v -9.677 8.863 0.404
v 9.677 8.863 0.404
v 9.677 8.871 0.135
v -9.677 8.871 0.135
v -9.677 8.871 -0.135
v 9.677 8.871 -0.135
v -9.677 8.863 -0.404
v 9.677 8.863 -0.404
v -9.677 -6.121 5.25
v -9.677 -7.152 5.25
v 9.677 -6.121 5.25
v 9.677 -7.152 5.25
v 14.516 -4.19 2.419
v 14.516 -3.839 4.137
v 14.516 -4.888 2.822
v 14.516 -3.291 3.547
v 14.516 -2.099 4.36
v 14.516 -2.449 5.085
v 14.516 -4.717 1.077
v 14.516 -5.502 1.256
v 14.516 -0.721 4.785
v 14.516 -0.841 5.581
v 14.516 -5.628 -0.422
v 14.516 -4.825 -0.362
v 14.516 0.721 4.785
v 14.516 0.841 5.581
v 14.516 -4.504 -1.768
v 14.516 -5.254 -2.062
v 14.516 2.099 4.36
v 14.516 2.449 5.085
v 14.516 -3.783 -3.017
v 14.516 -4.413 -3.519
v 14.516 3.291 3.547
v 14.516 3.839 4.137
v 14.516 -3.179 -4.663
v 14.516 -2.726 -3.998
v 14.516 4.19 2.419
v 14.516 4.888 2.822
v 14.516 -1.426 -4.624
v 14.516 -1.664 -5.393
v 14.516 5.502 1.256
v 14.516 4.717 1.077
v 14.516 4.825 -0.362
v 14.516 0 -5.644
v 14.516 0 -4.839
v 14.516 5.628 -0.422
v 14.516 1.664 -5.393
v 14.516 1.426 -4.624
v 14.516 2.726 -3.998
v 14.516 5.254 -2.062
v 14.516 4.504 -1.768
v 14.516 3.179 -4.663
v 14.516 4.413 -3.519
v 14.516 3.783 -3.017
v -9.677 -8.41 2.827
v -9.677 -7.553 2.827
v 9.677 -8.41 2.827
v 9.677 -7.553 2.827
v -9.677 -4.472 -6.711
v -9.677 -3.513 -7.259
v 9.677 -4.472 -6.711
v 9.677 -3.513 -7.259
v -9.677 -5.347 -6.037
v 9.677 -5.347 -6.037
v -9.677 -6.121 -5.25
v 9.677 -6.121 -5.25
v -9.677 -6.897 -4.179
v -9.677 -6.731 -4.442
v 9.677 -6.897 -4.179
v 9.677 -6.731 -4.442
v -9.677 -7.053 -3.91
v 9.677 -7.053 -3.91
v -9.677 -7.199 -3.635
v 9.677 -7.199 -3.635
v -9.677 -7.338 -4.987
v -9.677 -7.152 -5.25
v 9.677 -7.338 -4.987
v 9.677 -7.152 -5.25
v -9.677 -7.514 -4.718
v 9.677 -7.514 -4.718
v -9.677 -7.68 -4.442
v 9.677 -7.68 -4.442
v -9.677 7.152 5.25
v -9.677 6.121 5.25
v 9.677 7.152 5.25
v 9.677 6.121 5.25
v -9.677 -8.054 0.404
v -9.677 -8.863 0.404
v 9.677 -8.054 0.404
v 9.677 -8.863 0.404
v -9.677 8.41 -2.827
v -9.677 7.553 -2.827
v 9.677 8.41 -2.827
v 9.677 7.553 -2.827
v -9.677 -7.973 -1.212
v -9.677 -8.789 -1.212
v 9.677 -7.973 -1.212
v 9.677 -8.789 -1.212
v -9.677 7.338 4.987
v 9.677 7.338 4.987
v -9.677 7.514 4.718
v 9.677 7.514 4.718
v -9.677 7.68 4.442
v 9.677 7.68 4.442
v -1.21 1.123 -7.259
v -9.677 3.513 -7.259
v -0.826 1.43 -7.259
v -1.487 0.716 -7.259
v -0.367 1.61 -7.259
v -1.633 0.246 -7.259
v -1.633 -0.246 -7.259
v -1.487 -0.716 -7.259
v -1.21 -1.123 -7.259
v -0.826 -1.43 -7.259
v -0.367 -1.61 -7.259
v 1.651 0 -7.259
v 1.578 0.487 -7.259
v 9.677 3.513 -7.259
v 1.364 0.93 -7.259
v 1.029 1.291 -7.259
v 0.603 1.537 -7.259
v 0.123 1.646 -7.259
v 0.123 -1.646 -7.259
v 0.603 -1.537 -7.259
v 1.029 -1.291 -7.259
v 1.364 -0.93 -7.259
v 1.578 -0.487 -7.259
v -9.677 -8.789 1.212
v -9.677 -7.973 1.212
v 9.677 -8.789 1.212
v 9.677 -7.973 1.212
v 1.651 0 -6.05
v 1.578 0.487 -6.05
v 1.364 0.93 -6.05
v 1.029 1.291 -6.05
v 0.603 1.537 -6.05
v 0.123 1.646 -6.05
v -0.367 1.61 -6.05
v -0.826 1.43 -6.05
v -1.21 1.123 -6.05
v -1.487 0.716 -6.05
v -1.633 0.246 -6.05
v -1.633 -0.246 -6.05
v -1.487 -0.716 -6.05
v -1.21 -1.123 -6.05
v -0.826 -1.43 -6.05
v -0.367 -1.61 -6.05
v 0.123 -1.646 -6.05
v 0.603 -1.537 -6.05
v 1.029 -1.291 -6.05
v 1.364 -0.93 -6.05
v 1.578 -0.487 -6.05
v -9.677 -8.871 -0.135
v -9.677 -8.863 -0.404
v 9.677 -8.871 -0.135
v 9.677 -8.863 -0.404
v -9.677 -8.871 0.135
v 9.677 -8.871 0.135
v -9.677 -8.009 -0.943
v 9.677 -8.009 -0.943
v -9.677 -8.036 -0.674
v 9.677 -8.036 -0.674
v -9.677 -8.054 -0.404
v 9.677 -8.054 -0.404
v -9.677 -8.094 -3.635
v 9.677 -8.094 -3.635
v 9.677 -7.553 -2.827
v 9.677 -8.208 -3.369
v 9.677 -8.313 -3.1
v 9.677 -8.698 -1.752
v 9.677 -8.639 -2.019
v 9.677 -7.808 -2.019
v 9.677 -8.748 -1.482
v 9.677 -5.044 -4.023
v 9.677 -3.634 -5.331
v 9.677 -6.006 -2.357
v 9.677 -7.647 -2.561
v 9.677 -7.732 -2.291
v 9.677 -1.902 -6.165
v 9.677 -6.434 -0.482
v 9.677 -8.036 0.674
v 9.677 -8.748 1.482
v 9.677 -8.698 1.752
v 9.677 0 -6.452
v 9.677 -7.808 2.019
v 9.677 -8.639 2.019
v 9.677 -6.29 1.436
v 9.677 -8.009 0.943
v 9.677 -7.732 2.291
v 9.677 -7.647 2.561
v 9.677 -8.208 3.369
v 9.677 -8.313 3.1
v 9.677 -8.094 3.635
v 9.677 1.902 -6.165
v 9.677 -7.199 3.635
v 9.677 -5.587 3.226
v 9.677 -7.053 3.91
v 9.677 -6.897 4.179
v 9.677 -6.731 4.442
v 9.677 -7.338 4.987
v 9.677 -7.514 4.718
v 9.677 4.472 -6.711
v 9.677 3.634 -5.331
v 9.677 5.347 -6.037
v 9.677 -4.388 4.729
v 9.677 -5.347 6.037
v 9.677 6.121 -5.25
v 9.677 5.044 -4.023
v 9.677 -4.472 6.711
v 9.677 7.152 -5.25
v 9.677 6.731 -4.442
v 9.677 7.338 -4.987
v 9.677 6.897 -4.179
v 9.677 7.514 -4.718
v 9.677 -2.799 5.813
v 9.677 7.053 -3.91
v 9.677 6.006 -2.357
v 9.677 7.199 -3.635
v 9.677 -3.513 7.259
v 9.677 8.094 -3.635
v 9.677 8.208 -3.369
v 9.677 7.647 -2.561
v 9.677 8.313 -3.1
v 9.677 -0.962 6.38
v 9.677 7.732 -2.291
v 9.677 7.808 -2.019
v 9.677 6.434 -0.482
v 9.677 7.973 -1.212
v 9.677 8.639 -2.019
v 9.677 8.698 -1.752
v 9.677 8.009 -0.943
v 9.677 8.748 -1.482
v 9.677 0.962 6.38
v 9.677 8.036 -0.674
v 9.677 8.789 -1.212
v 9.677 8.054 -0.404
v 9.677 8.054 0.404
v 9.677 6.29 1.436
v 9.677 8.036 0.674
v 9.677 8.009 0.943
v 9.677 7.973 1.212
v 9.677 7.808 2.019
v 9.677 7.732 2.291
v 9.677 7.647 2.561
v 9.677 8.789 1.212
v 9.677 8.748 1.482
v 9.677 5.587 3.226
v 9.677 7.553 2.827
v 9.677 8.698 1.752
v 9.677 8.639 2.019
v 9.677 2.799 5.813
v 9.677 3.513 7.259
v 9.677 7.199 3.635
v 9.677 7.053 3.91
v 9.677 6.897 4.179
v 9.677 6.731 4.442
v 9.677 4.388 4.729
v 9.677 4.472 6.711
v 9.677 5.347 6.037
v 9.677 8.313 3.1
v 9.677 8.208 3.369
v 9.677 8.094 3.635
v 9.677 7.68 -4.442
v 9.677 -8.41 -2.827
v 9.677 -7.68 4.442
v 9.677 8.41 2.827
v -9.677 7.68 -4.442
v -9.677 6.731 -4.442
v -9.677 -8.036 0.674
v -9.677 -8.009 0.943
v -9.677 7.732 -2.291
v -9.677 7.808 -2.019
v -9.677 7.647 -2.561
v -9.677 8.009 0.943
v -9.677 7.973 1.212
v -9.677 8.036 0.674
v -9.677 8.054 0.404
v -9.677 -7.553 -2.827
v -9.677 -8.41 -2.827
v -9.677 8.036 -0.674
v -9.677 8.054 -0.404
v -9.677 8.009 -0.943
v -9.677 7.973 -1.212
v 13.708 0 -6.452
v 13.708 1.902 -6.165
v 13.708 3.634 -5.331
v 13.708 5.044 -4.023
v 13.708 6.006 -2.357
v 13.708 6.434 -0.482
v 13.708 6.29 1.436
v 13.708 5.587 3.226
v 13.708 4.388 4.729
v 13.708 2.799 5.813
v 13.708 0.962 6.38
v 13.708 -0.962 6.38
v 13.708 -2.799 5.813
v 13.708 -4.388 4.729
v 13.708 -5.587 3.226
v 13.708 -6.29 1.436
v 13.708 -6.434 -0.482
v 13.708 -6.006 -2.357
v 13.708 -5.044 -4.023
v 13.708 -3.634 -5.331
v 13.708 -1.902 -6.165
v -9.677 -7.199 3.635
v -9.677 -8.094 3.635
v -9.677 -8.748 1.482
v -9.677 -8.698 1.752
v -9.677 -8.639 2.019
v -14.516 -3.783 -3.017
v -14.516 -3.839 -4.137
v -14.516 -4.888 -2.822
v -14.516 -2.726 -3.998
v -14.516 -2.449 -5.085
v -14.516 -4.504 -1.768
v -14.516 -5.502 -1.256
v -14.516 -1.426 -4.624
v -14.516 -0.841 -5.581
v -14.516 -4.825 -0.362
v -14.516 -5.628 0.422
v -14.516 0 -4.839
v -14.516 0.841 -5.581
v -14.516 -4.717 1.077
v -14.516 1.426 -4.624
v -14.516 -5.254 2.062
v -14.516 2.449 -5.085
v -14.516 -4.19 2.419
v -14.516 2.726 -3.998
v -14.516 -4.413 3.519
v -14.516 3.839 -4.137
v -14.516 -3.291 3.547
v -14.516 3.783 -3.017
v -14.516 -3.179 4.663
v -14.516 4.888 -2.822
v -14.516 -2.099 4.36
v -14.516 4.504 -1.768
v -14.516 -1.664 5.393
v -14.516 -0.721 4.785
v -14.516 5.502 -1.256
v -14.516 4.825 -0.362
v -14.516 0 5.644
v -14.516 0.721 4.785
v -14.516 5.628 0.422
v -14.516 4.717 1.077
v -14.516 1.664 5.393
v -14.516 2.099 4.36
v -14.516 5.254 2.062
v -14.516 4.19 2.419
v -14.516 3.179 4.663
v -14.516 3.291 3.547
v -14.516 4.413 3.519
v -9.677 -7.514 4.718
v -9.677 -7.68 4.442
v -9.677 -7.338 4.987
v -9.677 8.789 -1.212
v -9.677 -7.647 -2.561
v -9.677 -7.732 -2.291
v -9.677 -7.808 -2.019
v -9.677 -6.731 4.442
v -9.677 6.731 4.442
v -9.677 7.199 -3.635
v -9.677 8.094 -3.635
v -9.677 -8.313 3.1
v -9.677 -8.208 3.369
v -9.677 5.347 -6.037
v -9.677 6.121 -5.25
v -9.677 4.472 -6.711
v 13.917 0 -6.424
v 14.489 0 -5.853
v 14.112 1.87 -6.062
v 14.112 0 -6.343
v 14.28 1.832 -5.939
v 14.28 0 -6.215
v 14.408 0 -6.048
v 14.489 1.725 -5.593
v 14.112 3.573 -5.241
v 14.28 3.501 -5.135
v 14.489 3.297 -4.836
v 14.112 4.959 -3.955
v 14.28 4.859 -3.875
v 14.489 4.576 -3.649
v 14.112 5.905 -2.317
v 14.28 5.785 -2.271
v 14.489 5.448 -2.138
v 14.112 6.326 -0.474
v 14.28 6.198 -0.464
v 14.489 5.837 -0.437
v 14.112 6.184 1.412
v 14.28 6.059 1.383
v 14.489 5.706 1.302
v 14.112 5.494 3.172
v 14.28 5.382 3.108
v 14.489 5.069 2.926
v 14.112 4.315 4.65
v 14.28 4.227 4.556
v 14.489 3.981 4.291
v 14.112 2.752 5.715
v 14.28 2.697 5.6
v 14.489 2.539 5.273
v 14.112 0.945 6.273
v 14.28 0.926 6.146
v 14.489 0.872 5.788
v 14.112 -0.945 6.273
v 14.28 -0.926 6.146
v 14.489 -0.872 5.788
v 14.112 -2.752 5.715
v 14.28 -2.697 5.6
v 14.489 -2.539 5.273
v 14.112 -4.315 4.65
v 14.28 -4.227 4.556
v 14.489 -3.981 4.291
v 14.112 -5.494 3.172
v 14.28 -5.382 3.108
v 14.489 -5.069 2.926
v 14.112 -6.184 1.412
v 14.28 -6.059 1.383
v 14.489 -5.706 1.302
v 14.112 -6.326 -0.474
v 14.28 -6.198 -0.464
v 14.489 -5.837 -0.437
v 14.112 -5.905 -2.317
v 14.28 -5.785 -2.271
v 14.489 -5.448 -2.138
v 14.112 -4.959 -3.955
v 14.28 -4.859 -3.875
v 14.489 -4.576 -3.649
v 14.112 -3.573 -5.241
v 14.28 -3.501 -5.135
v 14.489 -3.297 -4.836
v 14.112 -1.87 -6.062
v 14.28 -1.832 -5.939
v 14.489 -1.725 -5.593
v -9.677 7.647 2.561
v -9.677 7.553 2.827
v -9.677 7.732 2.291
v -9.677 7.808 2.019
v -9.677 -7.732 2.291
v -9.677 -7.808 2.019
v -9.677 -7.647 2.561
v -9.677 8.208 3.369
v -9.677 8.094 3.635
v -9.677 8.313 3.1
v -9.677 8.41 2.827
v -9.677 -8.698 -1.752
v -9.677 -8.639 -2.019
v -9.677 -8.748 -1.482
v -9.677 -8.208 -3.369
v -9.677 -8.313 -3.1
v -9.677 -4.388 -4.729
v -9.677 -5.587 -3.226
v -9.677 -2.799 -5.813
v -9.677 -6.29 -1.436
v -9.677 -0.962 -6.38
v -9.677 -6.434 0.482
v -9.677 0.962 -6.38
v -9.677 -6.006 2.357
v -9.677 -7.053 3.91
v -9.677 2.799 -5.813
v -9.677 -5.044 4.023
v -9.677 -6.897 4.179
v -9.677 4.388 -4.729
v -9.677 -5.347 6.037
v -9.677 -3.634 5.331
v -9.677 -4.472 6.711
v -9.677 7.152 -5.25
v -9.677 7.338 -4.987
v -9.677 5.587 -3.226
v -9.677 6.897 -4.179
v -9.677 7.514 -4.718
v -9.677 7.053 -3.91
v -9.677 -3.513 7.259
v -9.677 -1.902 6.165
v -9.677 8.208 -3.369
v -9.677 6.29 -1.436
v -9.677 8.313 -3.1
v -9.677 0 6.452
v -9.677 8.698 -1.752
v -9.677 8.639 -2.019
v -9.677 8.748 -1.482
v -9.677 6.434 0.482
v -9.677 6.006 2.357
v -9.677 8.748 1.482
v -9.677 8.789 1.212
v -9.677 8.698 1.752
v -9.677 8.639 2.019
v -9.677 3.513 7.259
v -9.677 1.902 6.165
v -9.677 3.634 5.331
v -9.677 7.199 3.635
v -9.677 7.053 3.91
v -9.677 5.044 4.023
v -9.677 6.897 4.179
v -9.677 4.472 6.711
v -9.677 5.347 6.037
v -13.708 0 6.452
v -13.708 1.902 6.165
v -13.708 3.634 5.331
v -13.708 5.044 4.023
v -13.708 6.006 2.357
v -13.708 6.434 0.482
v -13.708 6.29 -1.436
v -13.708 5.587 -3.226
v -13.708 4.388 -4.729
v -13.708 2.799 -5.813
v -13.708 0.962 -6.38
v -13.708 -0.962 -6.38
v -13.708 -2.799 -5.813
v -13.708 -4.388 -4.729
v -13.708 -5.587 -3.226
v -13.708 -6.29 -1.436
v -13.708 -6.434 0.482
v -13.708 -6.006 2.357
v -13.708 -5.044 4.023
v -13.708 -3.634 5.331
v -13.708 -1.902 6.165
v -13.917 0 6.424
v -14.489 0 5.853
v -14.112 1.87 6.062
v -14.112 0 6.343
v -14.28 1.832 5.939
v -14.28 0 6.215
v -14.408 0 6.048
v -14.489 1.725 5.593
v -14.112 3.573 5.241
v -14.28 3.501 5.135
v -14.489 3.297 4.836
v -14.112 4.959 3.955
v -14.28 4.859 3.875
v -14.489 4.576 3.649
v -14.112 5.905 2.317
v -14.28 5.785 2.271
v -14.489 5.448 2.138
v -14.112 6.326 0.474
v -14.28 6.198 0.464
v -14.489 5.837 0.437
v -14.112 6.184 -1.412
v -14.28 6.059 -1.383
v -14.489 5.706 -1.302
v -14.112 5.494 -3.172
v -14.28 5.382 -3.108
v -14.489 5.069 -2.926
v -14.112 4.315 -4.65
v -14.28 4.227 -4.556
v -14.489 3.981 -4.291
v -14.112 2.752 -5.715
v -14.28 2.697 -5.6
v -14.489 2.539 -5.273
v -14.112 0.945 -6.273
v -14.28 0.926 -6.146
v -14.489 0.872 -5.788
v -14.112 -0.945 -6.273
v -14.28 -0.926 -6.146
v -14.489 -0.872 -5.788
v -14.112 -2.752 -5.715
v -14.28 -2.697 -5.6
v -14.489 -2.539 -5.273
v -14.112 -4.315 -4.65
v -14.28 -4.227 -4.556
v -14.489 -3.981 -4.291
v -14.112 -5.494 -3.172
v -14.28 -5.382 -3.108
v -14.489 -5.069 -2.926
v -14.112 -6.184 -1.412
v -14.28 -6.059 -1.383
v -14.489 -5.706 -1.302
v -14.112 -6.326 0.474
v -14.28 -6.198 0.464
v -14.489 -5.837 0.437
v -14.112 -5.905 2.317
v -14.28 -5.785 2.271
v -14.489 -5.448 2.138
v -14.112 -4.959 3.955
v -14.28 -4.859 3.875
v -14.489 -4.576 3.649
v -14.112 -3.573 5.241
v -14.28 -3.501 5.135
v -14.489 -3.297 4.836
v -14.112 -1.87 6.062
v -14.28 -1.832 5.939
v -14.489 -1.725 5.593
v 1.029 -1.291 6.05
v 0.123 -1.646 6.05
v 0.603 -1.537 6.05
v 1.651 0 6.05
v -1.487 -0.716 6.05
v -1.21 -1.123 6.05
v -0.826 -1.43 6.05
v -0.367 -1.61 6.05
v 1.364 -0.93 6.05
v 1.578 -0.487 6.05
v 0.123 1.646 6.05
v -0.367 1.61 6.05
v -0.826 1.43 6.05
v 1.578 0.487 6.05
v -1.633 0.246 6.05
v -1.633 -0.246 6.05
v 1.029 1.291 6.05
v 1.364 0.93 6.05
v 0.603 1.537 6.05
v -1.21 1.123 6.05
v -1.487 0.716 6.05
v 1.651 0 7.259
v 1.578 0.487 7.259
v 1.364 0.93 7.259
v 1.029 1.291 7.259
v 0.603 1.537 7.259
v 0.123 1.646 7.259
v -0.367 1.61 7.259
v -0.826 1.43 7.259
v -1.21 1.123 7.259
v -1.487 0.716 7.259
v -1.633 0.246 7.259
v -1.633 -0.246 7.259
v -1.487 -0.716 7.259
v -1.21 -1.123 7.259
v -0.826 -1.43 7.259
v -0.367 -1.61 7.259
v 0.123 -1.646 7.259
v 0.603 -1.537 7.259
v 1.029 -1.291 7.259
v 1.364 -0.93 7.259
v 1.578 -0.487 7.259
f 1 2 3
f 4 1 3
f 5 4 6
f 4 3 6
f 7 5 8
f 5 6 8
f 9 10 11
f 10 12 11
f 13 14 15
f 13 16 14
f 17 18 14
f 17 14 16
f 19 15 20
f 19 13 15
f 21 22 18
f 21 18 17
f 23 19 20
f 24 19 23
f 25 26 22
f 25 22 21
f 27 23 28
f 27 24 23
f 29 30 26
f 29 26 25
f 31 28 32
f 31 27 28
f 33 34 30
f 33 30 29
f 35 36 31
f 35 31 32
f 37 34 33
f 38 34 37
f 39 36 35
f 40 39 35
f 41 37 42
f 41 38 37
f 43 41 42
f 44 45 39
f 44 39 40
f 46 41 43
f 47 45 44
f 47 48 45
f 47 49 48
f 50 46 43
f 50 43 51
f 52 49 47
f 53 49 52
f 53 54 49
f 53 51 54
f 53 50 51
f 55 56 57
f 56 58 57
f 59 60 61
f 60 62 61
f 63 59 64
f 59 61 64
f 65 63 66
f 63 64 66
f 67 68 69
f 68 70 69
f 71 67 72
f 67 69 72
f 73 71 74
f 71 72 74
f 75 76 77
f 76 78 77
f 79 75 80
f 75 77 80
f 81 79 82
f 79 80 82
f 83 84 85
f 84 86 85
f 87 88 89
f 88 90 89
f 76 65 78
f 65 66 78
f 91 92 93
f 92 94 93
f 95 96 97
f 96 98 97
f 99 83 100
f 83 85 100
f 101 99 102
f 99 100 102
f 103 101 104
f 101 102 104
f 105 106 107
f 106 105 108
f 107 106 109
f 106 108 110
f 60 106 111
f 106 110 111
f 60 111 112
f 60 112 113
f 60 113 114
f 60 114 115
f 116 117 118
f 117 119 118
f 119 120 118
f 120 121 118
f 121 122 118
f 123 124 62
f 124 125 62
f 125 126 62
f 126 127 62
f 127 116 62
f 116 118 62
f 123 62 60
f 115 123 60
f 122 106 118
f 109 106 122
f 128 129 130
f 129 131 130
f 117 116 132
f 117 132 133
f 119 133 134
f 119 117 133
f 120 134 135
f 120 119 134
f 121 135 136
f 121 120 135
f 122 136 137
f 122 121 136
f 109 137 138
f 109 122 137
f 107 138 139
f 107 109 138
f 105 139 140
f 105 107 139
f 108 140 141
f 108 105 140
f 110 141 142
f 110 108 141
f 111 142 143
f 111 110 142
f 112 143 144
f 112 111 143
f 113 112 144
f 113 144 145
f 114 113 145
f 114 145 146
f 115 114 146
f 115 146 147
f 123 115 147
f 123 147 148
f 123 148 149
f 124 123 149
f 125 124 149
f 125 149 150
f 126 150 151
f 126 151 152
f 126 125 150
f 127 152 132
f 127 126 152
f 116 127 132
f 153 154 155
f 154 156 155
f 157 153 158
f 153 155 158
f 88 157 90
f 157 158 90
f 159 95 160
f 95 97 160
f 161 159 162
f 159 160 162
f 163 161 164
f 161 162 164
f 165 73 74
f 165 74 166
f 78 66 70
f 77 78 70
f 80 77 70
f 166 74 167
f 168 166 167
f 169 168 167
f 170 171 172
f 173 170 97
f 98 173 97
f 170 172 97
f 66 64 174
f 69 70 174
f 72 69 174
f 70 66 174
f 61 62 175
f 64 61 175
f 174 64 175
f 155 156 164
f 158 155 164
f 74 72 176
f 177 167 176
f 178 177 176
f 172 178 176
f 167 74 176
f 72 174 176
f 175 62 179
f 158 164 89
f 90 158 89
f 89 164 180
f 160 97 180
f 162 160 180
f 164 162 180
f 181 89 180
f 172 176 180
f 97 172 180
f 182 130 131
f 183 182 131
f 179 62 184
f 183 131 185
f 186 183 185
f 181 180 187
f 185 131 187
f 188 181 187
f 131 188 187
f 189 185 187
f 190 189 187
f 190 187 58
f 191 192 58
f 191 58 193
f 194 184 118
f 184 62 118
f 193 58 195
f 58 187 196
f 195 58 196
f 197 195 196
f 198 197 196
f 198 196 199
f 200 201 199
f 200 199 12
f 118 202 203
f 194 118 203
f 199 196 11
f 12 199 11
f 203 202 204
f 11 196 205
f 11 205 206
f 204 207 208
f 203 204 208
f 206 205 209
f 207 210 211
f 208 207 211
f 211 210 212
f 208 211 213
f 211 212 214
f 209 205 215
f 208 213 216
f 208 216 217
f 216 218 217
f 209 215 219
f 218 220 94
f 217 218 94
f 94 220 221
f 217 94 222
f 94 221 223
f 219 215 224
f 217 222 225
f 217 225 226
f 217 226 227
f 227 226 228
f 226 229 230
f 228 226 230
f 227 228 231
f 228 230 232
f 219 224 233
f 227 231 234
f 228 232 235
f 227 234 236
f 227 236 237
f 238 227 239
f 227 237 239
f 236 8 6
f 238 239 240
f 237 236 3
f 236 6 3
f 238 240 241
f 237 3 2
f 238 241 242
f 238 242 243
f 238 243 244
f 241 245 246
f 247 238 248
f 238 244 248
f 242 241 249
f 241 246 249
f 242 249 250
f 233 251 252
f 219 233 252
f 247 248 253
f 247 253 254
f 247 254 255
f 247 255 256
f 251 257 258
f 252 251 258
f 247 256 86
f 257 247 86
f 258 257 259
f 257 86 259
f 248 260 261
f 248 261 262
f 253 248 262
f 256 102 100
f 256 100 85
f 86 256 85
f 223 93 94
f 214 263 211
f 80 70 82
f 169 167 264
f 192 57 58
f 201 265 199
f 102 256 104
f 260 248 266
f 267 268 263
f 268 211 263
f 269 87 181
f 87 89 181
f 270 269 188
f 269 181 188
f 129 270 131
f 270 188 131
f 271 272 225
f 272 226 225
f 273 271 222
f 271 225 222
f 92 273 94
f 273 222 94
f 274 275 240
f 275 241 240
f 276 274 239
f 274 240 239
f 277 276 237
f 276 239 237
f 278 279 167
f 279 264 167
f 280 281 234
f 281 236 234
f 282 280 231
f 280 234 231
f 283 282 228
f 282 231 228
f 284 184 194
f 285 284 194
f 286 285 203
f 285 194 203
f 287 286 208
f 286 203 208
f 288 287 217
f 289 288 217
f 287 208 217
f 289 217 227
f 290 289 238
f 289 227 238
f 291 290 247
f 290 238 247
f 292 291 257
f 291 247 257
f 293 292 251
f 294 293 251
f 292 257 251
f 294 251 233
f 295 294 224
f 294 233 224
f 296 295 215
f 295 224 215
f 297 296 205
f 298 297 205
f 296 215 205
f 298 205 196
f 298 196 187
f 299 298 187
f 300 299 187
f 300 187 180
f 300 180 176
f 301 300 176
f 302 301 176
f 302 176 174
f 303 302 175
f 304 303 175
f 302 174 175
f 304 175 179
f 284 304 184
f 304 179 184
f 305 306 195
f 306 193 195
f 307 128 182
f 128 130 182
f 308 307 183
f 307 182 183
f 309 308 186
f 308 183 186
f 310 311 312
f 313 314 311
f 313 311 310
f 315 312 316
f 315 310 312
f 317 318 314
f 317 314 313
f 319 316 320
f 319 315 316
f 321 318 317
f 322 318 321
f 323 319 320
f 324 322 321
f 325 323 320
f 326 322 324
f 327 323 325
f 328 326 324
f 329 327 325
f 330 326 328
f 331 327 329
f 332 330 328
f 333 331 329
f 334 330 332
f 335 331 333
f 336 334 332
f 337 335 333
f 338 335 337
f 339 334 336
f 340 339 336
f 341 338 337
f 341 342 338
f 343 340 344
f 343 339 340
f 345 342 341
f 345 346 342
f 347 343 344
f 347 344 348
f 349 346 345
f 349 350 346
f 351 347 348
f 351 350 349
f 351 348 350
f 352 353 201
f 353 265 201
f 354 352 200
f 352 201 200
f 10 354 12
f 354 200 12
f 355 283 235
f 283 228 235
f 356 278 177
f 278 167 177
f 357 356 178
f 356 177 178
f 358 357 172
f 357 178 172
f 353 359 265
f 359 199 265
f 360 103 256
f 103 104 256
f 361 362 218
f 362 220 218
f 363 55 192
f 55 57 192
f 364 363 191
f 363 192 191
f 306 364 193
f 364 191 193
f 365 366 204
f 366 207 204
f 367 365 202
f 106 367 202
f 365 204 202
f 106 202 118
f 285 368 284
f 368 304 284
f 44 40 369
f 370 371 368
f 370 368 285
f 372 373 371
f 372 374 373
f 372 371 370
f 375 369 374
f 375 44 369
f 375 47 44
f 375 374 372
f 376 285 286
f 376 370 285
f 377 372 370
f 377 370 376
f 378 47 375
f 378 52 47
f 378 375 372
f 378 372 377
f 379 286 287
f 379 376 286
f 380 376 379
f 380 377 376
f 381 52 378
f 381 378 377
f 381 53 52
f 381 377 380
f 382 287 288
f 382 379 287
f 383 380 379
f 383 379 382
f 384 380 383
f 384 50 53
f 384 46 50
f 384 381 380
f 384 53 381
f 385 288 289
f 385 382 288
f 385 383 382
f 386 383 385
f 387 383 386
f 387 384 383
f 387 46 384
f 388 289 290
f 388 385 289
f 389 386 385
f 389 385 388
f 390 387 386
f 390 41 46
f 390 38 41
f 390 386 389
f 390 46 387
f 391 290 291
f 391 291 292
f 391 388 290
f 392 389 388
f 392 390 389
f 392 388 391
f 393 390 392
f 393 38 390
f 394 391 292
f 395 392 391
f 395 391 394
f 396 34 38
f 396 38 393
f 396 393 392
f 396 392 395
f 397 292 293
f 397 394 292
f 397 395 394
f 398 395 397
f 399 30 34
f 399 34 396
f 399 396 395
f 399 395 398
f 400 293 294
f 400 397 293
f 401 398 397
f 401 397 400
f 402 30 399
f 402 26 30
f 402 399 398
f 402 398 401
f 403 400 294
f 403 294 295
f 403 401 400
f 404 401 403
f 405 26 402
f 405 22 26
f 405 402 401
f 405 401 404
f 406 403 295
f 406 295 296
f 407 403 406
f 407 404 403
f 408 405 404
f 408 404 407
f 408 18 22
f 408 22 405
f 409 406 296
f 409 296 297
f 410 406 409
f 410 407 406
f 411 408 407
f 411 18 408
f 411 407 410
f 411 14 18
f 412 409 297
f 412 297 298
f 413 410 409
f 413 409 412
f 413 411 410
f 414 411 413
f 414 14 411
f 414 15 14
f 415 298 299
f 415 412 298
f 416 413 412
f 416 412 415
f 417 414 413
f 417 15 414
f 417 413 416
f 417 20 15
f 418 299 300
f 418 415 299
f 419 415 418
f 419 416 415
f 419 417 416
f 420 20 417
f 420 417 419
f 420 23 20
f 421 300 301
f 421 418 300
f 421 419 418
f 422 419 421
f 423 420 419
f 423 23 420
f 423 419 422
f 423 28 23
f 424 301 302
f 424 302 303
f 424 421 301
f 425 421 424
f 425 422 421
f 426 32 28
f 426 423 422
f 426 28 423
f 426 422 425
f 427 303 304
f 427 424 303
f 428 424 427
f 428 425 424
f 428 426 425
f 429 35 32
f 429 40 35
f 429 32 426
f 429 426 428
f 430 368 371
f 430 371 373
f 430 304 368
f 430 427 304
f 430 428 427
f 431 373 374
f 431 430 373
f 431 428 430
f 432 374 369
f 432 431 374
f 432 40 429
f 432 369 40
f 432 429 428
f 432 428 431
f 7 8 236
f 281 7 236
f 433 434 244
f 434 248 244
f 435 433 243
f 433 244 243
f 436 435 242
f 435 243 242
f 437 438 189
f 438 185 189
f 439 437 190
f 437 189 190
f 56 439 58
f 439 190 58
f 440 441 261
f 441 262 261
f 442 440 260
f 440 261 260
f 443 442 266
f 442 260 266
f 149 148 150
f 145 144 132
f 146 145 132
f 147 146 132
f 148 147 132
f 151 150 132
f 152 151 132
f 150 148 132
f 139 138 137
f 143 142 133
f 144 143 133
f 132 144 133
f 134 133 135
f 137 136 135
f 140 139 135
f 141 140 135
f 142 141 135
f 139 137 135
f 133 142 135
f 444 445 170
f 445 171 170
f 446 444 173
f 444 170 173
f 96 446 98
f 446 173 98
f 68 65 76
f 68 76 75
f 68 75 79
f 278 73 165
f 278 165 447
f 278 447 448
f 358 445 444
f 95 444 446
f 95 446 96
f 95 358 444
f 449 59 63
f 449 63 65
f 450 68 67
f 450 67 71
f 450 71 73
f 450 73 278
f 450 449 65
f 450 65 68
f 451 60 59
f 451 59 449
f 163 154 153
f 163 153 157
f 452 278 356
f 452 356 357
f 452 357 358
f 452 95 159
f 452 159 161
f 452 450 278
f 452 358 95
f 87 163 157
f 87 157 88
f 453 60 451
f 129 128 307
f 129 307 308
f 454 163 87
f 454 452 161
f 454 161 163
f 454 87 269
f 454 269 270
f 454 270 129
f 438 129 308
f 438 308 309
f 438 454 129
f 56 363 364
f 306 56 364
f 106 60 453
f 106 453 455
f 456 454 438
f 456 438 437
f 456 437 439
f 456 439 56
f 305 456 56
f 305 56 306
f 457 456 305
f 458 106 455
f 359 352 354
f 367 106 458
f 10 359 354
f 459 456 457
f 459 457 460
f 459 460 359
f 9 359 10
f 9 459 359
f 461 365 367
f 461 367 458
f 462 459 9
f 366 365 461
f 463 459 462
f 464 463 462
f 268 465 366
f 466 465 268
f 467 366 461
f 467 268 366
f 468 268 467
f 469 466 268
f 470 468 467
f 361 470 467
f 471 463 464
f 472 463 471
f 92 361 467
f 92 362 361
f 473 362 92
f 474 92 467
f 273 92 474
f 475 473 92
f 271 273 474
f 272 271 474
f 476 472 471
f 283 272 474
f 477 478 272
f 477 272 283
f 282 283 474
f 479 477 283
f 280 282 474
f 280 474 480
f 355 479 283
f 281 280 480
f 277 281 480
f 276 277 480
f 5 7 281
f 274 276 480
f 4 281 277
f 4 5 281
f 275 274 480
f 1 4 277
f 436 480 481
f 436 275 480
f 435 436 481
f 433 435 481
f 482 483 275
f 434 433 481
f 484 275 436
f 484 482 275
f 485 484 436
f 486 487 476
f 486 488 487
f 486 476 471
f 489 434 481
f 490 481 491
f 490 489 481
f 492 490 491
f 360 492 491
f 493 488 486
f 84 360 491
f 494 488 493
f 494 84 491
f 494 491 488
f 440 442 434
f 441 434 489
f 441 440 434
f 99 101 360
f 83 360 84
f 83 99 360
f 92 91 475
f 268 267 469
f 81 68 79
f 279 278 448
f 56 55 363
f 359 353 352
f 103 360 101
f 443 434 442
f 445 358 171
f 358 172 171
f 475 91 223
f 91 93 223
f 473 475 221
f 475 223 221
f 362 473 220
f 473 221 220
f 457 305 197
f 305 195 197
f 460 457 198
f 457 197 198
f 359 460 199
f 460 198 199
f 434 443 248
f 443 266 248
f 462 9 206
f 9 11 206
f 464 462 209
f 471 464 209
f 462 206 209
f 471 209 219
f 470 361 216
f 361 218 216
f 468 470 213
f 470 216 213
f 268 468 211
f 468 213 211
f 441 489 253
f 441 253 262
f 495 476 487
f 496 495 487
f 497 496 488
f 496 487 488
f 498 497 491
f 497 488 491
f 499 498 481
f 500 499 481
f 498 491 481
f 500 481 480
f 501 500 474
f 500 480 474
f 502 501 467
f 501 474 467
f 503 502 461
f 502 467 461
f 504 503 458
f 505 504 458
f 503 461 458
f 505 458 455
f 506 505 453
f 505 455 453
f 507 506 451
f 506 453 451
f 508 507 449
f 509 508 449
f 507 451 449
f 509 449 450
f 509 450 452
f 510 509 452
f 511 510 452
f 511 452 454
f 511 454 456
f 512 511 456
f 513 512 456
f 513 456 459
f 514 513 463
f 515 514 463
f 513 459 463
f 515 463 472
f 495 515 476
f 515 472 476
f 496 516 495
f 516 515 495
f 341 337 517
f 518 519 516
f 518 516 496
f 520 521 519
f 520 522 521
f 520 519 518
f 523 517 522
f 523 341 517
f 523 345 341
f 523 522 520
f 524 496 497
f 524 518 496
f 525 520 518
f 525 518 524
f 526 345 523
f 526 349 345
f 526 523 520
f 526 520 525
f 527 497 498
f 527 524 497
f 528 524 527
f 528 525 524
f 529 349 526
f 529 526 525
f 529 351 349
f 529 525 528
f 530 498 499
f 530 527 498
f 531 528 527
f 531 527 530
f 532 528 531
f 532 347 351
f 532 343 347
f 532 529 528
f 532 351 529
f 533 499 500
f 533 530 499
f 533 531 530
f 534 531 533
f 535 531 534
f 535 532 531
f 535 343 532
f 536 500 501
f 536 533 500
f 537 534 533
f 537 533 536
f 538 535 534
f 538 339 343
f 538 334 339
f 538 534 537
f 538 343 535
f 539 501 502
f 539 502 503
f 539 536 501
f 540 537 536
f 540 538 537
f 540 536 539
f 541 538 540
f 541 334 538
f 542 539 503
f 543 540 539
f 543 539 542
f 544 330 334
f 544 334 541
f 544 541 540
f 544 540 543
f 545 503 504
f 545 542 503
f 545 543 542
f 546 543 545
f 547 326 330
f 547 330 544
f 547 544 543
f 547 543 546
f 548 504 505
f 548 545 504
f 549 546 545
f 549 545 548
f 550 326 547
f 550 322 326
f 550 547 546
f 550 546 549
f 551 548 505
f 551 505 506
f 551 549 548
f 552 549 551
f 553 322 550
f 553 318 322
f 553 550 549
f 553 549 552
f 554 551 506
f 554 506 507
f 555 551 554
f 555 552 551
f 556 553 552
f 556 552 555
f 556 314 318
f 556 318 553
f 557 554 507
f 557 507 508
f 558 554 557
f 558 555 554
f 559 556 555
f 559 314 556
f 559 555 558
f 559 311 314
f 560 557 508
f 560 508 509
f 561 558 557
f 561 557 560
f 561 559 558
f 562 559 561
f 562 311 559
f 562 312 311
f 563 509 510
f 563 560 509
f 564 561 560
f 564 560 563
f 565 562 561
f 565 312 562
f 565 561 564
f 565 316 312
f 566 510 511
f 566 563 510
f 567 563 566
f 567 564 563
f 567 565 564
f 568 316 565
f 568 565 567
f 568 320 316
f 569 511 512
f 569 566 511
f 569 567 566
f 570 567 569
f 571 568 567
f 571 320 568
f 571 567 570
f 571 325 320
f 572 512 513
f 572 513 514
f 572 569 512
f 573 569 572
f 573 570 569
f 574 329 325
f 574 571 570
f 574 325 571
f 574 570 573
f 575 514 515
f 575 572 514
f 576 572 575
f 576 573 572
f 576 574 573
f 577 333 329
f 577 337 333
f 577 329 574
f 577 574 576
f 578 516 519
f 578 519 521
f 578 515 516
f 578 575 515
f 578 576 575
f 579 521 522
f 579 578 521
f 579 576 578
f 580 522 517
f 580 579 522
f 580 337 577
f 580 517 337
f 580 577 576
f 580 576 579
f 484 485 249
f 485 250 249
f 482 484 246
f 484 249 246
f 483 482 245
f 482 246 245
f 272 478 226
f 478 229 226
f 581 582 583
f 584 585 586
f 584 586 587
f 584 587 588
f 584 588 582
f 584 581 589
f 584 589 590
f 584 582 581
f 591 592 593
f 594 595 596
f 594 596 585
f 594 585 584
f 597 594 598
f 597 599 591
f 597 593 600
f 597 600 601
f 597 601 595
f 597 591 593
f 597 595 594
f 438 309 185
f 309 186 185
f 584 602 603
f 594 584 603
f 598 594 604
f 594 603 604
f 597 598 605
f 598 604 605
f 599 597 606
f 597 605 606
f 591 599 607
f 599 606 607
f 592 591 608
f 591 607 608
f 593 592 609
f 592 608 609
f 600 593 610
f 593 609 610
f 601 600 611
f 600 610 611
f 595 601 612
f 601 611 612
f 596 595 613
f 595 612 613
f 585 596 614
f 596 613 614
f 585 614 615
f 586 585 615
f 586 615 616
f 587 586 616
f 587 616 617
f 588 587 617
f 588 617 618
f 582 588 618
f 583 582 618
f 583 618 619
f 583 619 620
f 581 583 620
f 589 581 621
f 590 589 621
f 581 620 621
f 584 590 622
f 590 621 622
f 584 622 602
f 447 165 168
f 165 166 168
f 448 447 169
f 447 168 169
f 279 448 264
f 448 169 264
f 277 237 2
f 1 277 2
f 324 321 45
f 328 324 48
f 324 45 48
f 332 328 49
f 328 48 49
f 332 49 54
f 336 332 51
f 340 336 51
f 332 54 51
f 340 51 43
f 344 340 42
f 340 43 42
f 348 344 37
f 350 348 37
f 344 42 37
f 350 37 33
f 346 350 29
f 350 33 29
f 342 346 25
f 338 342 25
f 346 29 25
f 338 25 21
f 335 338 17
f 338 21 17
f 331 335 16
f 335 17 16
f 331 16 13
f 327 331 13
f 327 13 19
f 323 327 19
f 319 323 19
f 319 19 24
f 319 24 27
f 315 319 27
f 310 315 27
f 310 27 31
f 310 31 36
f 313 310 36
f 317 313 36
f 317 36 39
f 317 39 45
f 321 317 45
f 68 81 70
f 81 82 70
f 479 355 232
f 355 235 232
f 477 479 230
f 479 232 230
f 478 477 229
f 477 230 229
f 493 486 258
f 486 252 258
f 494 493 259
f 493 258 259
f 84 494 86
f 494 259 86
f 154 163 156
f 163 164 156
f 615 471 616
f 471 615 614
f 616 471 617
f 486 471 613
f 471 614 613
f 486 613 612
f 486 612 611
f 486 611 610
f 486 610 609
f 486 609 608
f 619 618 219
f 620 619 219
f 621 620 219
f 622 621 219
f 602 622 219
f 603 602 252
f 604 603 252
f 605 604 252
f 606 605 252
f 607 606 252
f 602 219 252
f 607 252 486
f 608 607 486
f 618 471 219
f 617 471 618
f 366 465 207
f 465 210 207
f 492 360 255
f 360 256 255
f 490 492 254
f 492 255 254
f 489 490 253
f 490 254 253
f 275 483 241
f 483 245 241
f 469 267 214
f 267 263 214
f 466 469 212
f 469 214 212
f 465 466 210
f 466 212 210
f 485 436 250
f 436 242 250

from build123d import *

# Parameters (mm, degrees)
BOSS_EXTRUDE1_DEPTH      = 9.6774
BOSS_EXTRUDE1_DEPTH_BACK = 9.6774
SKETCH2_R                = 6.4516
BOSS_EXTRUDE2_DEPTH      = 4.8387
SKETCH3_R                = 6.4516
BOSS_EXTRUDE3_DEPTH      = 4.8387
SKETCH4_R                = 4.8387
CUT_EXTRUDE1_DEPTH       = 30.0322
FILLET1_R                = 0.80772
SKETCH5_R                = 1.651
CUT_EXTRUDE2_DEPTH       = 1.20904


with BuildPart() as part:
    # Sketch1 → Boss-Extrude1 (new body, two sides)
    with BuildSketch(Plane(origin=(0, 0, 0), x_dir=(0, 0, -1), z_dir=(1, 0, 0))) as boss_extrude1_sk:
        with BuildLine():
            Line((0.40386, 8.863023459), (0.40386, 8.054381252))
            ThreePointArc((0.40386, 8.054381252), (0.80874507, 8.023845192), (1.21158, 7.972968967))
            Line((1.21158, 7.972968967), (1.21158, 8.789104712))
            ThreePointArc((1.21158, 8.789104712), (1.617173927, 8.723590787), (2.0193, 8.639370072))
            Line((2.0193, 8.639370072), (2.0193, 7.807598079))
            ThreePointArc((2.0193, 7.807598079), (2.426507892, 7.690787977), (2.82702, 7.552755667))
            Line((2.82702, 7.552755667), (2.82702, 8.409770844))
            ThreePointArc((2.82702, 8.409770844), (3.234747336, 8.261519073), (3.63474, 8.093513011))
            Line((3.63474, 8.093513011), (3.63474, 7.19894613))
            ThreePointArc((3.63474, 7.19894613), (4.04538399, 6.976462472), (4.44246, 6.730580168))
            Line((4.44246, 6.730580168), (4.44246, 7.679898233))
            ThreePointArc((4.44246, 7.679898233), (4.853501008, 7.426965443), (5.25018, 7.152055487))
            Line((5.25018, 7.152055487), (5.25018, 6.121418971))
            ThreePointArc((5.25018, 6.121418971), (6.389316694, 4.920649595), (7.25932, 3.512610623))
            Line((7.25932, 3.512610623), (7.25932, -3.512610623))
            ThreePointArc((7.25932, -3.512610623), (6.389316694, -4.920649595), (5.25018, -6.121418971))
            Line((5.25018, -6.121418971), (5.25018, -7.152055487))
            ThreePointArc((5.25018, -7.152055487), (4.853501008, -7.426965443), (4.44246, -7.679898233))
            Line((4.44246, -7.679898233), (4.44246, -6.730580168))
            ThreePointArc((4.44246, -6.730580168), (4.04538399, -6.976462472), (3.63474, -7.19894613))
            Line((3.63474, -7.19894613), (3.63474, -8.093513011))
            ThreePointArc((3.63474, -8.093513011), (3.234747336, -8.261519073), (2.82702, -8.409770844))
            Line((2.82702, -8.409770844), (2.82702, -7.552755667))
            ThreePointArc((2.82702, -7.552755667), (2.426507892, -7.690787977), (2.0193, -7.807598079))
            Line((2.0193, -7.807598079), (2.0193, -8.639370072))
            ThreePointArc((2.0193, -8.639370072), (1.617173927, -8.723590787), (1.21158, -8.789104712))
            Line((1.21158, -8.789104712), (1.21158, -7.972968967))
            ThreePointArc((1.21158, -7.972968967), (0.80874507, -8.023845192), (0.40386, -8.054381252))
            Line((0.40386, -8.054381252), (0.40386, -8.863023459))
            ThreePointArc((0.40386, -8.863023459), (0, -8.87222), (-0.40386, -8.863023459))
            Line((-0.40386, -8.863023459), (-0.40386, -8.054381252))
            ThreePointArc((-0.40386, -8.054381252), (-0.80874507, -8.023845192), (-1.21158, -7.972968967))
            Line((-1.21158, -7.972968967), (-1.21158, -8.789104712))
            ThreePointArc((-1.21158, -8.789104712), (-1.617173927, -8.723590787), (-2.0193, -8.639370072))
            Line((-2.0193, -8.639370072), (-2.0193, -7.807598079))
            ThreePointArc((-2.0193, -7.807598079), (-2.426507892, -7.690787977), (-2.82702, -7.552755667))
            Line((-2.82702, -7.552755667), (-2.82702, -8.409770844))
            ThreePointArc((-2.82702, -8.409770844), (-3.234747336, -8.261519073), (-3.63474, -8.093513011))
            Line((-3.63474, -8.093513011), (-3.63474, -7.19894613))
            ThreePointArc((-3.63474, -7.19894613), (-4.04538399, -6.976462472), (-4.44246, -6.730580168))
            Line((-4.44246, -6.730580168), (-4.44246, -7.679898233))
            ThreePointArc((-4.44246, -7.679898233), (-4.853501008, -7.426965443), (-5.25018, -7.152055487))
            Line((-5.25018, -7.152055487), (-5.25018, -6.121418971))
            ThreePointArc((-5.25018, -6.121418971), (-6.389316694, -4.920649595), (-7.25932, -3.512610623))
            Line((-7.25932, -3.512610623), (-7.25932, 3.512610623))
            ThreePointArc((-7.25932, 3.512610623), (-6.389316694, 4.920649595), (-5.25018, 6.121418971))
            Line((-5.25018, 6.121418971), (-5.25018, 7.152055487))
            ThreePointArc((-5.25018, 7.152055487), (-4.853501008, 7.426965443), (-4.44246, 7.679898233))
            Line((-4.44246, 7.679898233), (-4.44246, 6.730580168))
            ThreePointArc((-4.44246, 6.730580168), (-4.04538399, 6.976462472), (-3.63474, 7.19894613))
            Line((-3.63474, 7.19894613), (-3.63474, 8.093513011))
            ThreePointArc((-3.63474, 8.093513011), (-3.234747336, 8.261519073), (-2.82702, 8.409770844))
            Line((-2.82702, 8.409770844), (-2.82702, 7.552755667))
            ThreePointArc((-2.82702, 7.552755667), (-2.426507892, 7.690787977), (-2.0193, 7.807598079))
            Line((-2.0193, 7.807598079), (-2.0193, 8.639370072))
            ThreePointArc((-2.0193, 8.639370072), (-1.617173927, 8.723590787), (-1.21158, 8.789104712))
            Line((-1.21158, 8.789104712), (-1.21158, 7.972968967))
            ThreePointArc((-1.21158, 7.972968967), (-0.80874507, 8.023845192), (-0.40386, 8.054381252))
            Line((-0.40386, 8.054381252), (-0.40386, 8.863023459))
            ThreePointArc((-0.40386, 8.863023459), (0, 8.87222), (0.40386, 8.863023459))
        make_face()
    extrude(amount=BOSS_EXTRUDE1_DEPTH)
    extrude(boss_extrude1_sk.sketch, amount=-BOSS_EXTRUDE1_DEPTH_BACK)

    # Sketch2 → Boss-Extrude2 (add)
    with BuildSketch(Plane(origin=(9.6774, 0, 0), x_dir=(0, 0, -1), z_dir=(1, 0, 0))):
        Circle(SKETCH2_R)
    extrude(amount=BOSS_EXTRUDE2_DEPTH)

    # Sketch3 → Boss-Extrude3 (add)
    with BuildSketch(Plane.ZY.offset(9.6774)):
        Circle(SKETCH3_R)
    extrude(amount=BOSS_EXTRUDE3_DEPTH)

    # Sketch4 → Cut-Extrude1 (cut, through all)
    with BuildSketch(Plane(origin=(14.5161, 0, 0), x_dir=(0, 0, -1), z_dir=(1, 0, 0))):
        Circle(SKETCH4_R)
    extrude(amount=-CUT_EXTRUDE1_DEPTH, mode=Mode.SUBTRACT)

    # Fillet1
    fillet1_edges = [part.edges().sort_by_distance(p)[0] for p in [
        (14.5161, 0, 6.4516),
        (-14.5161, 0, -6.4516),
    ]]
    fillet(fillet1_edges, radius=FILLET1_R)

    # Sketch5 → Cut-Extrude2 (cut)
    with BuildSketch(Plane.XY.offset(7.25932)):
        Circle(SKETCH5_R)
    cut_extrude2 = extrude(amount=-CUT_EXTRUDE2_DEPTH, mode=Mode.SUBTRACT)

    # Mirror1: Cut-Extrude2 across plane
    add(cut_extrude2.mirror(Plane.XY), mode=Mode.SUBTRACT)


solid = part.part
